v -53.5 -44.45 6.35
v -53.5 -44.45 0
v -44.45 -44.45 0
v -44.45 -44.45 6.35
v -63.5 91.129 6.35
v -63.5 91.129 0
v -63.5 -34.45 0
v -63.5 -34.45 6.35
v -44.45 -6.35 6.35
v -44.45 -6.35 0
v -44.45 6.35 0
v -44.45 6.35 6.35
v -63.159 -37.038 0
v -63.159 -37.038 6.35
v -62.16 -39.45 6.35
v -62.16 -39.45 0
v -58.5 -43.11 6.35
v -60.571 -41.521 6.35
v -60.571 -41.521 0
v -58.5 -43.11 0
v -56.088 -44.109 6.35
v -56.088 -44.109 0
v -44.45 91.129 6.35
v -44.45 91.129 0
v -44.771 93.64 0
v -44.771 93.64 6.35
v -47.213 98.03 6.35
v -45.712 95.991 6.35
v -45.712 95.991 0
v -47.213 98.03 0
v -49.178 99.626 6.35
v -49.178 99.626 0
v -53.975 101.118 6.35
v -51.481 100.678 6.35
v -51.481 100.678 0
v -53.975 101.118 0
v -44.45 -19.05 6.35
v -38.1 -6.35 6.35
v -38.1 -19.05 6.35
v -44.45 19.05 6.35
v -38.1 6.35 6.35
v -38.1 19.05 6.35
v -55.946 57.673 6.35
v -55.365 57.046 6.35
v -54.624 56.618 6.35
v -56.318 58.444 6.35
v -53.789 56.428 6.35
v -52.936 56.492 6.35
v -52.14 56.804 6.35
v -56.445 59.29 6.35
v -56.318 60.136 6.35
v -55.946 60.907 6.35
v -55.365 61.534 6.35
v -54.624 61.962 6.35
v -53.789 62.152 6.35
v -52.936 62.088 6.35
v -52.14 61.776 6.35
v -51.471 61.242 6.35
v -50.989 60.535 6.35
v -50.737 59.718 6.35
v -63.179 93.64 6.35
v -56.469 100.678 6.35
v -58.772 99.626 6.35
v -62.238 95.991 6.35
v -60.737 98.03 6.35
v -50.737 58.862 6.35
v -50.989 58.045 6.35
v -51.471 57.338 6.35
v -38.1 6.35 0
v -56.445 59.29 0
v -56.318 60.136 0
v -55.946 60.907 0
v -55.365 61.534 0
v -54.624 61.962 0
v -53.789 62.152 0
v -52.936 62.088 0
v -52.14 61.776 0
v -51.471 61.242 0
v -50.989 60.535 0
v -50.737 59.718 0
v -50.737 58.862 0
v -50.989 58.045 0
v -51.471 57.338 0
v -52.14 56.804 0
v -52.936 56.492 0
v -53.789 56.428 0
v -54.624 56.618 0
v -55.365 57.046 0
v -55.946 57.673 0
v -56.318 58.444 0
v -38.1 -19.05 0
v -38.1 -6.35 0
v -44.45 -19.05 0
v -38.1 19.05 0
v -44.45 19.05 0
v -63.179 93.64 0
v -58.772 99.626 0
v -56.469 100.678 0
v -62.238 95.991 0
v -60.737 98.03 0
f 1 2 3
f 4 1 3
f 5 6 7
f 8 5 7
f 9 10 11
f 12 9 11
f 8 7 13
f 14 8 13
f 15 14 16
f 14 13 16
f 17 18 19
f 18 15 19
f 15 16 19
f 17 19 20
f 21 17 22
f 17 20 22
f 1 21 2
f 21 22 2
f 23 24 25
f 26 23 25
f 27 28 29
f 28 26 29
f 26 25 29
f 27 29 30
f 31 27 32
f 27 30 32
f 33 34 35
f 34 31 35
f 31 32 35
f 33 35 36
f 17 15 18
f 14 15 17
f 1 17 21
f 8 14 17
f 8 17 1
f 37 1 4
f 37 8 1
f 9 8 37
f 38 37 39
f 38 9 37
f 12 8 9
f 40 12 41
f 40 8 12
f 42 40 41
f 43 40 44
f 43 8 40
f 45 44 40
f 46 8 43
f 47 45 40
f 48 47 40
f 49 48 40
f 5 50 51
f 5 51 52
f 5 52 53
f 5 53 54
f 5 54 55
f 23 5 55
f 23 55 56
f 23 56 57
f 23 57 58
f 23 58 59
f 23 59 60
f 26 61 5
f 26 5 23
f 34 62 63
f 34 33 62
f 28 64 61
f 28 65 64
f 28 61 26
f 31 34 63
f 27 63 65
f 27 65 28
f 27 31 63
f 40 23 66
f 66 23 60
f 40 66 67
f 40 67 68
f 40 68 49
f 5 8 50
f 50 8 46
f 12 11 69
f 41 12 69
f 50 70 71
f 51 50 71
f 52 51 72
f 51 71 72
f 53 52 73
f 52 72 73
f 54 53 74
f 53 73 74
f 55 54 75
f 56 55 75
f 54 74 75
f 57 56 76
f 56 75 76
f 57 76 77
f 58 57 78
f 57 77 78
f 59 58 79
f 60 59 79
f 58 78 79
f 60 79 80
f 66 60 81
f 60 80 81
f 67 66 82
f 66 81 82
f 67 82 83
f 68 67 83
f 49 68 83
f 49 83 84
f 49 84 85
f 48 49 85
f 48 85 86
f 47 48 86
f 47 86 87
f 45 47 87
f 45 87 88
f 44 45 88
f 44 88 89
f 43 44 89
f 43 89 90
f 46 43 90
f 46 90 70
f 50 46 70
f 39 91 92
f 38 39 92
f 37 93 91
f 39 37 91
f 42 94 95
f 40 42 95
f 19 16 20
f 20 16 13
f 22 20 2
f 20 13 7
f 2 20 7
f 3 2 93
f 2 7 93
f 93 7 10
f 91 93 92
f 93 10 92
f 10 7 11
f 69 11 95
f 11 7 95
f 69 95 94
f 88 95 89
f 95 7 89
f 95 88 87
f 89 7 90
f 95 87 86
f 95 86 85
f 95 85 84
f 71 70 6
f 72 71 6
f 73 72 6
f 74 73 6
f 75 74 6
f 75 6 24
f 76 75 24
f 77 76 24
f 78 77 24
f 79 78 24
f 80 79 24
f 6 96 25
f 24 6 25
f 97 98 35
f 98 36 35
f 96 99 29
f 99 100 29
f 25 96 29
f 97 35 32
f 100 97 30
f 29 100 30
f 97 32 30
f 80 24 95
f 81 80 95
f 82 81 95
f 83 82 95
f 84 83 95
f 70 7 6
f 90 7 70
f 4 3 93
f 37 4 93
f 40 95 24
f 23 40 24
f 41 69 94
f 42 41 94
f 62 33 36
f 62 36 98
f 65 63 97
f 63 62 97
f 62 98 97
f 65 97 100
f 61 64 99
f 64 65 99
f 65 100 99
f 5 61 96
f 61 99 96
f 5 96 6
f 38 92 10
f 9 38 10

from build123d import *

# Parameters (mm, degrees)
BOSS_EXTRUDE1_DEPTH = 6.35
FILLET1_R           = 10
SKETCH2_R           = 2.8702
CUT_EXTRUDE3_DEPTH  = 120.57148989


with BuildPart() as part:
    # Sketch1 → Boss-Extrude1 (new body)
    with BuildSketch(Plane.XY):
        Polygon((-44.45, 19.05), (-44.45, 101.128885963), (-63.5, 101.128885963), (-63.5, -44.45), (-44.45, -44.45), (-44.45, -19.05), (-38.1, -19.05), (-38.1, -6.35), (-44.45, -6.35), (-44.45, 6.35), (-38.1, 6.35), (-38.1, 19.05), align=None)
    extrude(amount=BOSS_EXTRUDE1_DEPTH)

    # Fillet1
    # the kernel refuses this fillet: 10 mm, written as the material it takes off along each edge
    with BuildSketch(Plane(origin=(-63.5, -44.45, -25), x_dir=(0, 1, 0), z_dir=(0, 0, 1)), Plane(origin=(-44.45, 101.128885963, -25), x_dir=(0, -1, 0), z_dir=(0, 0, 1)), Plane(origin=(-63.5, 101.128885963, -25), x_dir=(1, 0, 0), z_dir=(0, 0, 1))) as fillet1_piece_1:
        with BuildLine():
            CenterArc((FILLET1_R, -FILLET1_R), FILLET1_R, 90, 90)
            Line((0, -FILLET1_R), (0, 0))
            Line((0, 0), (FILLET1_R, 0))
        make_face()
    extrude(amount=56.35, mode=Mode.SUBTRACT)

    # Sketch2 → Cut-Extrude3 (cut, through all)
    with BuildSketch(Plane(origin=(0, 0, 0), x_dir=(-1, 0, 0), z_dir=(0, 0, -1))):
        with Locations((53.575, 59.289941788)):
            Circle(SKETCH2_R)
    extrude(amount=-CUT_EXTRUDE3_DEPTH, mode=Mode.SUBTRACT)


solid = part.part
